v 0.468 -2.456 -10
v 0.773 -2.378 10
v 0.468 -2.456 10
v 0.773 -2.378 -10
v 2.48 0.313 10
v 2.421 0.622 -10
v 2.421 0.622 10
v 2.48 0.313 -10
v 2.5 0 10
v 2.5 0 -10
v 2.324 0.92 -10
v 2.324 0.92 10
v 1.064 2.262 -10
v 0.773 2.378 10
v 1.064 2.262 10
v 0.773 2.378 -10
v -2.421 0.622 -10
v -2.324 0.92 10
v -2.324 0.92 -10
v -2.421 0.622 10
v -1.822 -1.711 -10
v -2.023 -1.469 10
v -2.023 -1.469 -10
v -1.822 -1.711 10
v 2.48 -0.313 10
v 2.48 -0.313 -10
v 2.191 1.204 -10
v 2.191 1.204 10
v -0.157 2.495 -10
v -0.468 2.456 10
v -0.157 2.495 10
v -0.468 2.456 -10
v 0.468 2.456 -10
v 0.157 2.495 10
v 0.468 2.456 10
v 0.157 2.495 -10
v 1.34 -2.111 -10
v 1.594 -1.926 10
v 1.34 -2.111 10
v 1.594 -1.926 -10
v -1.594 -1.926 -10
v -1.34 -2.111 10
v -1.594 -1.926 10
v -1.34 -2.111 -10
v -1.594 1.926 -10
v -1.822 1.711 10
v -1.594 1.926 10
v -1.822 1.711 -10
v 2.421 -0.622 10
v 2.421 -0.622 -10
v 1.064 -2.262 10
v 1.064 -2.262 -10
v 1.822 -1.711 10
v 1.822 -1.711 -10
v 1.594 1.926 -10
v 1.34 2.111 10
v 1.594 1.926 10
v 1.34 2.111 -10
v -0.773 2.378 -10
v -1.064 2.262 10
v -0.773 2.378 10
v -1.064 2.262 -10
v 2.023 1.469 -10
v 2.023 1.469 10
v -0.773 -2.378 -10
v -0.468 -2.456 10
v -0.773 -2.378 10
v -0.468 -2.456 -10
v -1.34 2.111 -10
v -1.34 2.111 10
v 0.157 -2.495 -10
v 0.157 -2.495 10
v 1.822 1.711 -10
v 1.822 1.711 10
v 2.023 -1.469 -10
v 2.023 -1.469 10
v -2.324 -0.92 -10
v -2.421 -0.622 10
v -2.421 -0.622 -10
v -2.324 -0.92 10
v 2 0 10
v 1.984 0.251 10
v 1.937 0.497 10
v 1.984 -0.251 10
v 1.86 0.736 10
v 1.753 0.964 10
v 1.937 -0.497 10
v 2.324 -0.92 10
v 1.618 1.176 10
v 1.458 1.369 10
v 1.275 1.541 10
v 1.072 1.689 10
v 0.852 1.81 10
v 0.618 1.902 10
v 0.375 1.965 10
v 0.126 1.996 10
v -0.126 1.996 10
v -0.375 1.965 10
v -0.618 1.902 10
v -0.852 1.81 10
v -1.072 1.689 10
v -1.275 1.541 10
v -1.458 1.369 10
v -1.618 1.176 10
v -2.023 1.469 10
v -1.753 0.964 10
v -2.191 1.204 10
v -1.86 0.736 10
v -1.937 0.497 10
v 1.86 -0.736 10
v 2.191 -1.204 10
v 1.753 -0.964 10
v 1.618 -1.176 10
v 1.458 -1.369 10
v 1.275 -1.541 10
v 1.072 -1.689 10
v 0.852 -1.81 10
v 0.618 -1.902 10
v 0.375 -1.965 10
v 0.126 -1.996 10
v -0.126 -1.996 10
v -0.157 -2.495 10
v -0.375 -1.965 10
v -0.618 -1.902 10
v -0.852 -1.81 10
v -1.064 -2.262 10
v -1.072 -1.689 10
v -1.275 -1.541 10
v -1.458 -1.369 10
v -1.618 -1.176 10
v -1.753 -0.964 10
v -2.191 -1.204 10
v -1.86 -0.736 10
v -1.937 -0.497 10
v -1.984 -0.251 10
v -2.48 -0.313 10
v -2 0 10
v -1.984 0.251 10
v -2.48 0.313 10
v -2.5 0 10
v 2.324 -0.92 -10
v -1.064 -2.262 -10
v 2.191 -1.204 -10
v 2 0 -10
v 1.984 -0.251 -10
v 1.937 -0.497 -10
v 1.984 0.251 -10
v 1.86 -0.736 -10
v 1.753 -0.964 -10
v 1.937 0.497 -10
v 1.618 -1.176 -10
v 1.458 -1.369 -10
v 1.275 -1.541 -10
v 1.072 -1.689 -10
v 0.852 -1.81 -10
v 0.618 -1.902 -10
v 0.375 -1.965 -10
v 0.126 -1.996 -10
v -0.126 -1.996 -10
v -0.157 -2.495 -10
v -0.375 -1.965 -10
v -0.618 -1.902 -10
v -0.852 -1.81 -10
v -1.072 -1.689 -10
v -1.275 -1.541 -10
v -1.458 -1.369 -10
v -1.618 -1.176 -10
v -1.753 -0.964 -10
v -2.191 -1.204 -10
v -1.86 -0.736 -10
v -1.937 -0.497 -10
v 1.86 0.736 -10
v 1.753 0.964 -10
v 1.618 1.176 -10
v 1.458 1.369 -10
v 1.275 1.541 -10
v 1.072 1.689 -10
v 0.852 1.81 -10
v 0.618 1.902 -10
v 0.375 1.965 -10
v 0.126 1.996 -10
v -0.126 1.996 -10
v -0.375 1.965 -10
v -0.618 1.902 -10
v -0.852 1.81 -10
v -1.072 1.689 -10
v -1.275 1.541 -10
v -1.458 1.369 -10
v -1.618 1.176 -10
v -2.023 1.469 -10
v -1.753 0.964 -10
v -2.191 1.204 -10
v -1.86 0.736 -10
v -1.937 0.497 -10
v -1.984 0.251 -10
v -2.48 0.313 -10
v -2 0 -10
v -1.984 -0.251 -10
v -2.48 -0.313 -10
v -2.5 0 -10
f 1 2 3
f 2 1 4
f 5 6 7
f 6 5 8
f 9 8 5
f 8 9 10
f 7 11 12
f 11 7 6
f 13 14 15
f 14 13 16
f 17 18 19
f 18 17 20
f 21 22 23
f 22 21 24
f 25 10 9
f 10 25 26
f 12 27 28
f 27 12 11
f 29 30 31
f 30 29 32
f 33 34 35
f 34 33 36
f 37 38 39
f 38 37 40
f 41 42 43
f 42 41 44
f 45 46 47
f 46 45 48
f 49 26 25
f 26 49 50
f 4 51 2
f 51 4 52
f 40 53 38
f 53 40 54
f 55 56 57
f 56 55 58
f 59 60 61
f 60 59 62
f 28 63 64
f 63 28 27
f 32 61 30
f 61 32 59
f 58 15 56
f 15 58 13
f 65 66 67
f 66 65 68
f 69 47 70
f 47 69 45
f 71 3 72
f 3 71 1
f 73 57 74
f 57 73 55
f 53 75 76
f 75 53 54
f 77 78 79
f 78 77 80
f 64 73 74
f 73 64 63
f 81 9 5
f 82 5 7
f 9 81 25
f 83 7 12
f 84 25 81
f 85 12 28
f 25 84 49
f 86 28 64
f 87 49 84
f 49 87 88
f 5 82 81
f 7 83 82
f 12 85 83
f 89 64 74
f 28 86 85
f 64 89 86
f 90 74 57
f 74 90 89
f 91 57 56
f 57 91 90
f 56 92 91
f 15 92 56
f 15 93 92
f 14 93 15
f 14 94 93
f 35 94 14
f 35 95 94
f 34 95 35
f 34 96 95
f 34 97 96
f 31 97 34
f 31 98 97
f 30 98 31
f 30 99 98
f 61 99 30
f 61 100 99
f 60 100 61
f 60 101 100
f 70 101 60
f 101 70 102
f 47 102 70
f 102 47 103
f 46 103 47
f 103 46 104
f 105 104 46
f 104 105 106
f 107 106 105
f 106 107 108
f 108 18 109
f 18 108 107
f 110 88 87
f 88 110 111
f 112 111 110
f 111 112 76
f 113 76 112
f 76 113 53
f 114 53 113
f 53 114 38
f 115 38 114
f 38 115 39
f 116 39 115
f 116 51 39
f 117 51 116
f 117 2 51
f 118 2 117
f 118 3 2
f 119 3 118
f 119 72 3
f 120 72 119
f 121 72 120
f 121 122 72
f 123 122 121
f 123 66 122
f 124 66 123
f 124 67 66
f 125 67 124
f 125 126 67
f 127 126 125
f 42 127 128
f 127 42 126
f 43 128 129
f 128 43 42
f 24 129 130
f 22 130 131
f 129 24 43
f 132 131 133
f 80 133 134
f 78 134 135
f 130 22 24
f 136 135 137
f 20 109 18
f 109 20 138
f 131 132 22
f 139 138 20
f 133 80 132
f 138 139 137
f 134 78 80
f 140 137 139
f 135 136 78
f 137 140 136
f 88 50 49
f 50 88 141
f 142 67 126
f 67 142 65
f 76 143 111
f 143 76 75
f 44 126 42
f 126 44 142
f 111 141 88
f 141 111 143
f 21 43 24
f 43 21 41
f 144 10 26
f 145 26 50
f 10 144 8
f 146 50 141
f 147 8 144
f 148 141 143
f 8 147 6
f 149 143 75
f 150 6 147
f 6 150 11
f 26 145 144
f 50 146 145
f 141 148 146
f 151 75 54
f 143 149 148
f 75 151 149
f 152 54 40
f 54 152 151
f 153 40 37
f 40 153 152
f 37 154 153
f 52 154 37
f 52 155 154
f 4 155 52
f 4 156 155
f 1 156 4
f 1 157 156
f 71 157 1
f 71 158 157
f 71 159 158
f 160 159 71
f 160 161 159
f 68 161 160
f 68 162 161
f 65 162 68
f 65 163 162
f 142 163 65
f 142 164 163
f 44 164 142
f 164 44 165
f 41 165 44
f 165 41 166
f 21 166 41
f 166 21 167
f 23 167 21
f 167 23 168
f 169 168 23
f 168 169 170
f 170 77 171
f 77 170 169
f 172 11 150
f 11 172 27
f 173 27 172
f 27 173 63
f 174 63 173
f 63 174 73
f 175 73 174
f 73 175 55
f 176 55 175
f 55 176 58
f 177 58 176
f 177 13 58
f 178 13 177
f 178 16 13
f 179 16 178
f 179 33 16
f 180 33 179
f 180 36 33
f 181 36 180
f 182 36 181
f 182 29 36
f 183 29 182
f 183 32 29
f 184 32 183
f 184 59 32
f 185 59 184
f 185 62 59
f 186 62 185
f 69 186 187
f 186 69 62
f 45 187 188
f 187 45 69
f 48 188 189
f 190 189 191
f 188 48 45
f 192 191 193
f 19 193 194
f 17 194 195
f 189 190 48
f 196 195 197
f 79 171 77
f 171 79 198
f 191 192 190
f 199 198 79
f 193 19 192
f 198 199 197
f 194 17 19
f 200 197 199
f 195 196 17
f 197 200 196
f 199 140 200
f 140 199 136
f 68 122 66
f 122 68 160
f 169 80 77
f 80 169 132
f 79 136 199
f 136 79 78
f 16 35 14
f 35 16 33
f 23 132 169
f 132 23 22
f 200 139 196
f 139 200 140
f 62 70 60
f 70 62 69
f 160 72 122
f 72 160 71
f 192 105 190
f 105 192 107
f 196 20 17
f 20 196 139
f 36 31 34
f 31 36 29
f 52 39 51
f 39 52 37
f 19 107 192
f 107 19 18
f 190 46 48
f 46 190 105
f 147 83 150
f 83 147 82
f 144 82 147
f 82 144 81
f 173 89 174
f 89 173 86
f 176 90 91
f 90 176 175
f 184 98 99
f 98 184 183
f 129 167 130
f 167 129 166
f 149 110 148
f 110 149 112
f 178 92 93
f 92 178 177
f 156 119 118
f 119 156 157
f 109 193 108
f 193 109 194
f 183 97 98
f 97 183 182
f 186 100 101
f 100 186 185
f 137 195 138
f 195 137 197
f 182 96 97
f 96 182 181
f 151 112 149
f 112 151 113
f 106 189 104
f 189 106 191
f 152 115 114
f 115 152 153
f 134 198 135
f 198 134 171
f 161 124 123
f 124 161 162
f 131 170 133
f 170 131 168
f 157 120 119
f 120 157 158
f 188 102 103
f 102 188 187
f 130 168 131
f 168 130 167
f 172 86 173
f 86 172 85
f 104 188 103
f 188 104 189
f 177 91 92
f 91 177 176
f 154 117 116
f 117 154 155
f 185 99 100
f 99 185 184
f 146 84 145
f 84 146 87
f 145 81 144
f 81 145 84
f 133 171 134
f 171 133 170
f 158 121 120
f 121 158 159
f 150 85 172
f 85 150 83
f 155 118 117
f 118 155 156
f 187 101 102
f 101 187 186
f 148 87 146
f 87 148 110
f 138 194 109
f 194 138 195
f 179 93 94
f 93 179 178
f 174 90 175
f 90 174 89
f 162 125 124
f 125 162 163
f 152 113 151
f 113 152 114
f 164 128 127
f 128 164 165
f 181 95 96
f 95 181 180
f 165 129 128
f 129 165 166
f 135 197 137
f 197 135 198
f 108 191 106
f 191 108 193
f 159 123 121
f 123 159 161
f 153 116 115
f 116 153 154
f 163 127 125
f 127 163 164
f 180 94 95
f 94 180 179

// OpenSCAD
$fn = 50;


difference() {
	union() {
		translate(v = [0, 0, -10.0000000000]) {
			cylinder(h = 20, r = 2.5000000000);
		}
	}
	union() {
		translate(v = [0, 0, -100.0000000000]) {
			cylinder(h = 200, r = 2.0000000000);
		}
	}
}
